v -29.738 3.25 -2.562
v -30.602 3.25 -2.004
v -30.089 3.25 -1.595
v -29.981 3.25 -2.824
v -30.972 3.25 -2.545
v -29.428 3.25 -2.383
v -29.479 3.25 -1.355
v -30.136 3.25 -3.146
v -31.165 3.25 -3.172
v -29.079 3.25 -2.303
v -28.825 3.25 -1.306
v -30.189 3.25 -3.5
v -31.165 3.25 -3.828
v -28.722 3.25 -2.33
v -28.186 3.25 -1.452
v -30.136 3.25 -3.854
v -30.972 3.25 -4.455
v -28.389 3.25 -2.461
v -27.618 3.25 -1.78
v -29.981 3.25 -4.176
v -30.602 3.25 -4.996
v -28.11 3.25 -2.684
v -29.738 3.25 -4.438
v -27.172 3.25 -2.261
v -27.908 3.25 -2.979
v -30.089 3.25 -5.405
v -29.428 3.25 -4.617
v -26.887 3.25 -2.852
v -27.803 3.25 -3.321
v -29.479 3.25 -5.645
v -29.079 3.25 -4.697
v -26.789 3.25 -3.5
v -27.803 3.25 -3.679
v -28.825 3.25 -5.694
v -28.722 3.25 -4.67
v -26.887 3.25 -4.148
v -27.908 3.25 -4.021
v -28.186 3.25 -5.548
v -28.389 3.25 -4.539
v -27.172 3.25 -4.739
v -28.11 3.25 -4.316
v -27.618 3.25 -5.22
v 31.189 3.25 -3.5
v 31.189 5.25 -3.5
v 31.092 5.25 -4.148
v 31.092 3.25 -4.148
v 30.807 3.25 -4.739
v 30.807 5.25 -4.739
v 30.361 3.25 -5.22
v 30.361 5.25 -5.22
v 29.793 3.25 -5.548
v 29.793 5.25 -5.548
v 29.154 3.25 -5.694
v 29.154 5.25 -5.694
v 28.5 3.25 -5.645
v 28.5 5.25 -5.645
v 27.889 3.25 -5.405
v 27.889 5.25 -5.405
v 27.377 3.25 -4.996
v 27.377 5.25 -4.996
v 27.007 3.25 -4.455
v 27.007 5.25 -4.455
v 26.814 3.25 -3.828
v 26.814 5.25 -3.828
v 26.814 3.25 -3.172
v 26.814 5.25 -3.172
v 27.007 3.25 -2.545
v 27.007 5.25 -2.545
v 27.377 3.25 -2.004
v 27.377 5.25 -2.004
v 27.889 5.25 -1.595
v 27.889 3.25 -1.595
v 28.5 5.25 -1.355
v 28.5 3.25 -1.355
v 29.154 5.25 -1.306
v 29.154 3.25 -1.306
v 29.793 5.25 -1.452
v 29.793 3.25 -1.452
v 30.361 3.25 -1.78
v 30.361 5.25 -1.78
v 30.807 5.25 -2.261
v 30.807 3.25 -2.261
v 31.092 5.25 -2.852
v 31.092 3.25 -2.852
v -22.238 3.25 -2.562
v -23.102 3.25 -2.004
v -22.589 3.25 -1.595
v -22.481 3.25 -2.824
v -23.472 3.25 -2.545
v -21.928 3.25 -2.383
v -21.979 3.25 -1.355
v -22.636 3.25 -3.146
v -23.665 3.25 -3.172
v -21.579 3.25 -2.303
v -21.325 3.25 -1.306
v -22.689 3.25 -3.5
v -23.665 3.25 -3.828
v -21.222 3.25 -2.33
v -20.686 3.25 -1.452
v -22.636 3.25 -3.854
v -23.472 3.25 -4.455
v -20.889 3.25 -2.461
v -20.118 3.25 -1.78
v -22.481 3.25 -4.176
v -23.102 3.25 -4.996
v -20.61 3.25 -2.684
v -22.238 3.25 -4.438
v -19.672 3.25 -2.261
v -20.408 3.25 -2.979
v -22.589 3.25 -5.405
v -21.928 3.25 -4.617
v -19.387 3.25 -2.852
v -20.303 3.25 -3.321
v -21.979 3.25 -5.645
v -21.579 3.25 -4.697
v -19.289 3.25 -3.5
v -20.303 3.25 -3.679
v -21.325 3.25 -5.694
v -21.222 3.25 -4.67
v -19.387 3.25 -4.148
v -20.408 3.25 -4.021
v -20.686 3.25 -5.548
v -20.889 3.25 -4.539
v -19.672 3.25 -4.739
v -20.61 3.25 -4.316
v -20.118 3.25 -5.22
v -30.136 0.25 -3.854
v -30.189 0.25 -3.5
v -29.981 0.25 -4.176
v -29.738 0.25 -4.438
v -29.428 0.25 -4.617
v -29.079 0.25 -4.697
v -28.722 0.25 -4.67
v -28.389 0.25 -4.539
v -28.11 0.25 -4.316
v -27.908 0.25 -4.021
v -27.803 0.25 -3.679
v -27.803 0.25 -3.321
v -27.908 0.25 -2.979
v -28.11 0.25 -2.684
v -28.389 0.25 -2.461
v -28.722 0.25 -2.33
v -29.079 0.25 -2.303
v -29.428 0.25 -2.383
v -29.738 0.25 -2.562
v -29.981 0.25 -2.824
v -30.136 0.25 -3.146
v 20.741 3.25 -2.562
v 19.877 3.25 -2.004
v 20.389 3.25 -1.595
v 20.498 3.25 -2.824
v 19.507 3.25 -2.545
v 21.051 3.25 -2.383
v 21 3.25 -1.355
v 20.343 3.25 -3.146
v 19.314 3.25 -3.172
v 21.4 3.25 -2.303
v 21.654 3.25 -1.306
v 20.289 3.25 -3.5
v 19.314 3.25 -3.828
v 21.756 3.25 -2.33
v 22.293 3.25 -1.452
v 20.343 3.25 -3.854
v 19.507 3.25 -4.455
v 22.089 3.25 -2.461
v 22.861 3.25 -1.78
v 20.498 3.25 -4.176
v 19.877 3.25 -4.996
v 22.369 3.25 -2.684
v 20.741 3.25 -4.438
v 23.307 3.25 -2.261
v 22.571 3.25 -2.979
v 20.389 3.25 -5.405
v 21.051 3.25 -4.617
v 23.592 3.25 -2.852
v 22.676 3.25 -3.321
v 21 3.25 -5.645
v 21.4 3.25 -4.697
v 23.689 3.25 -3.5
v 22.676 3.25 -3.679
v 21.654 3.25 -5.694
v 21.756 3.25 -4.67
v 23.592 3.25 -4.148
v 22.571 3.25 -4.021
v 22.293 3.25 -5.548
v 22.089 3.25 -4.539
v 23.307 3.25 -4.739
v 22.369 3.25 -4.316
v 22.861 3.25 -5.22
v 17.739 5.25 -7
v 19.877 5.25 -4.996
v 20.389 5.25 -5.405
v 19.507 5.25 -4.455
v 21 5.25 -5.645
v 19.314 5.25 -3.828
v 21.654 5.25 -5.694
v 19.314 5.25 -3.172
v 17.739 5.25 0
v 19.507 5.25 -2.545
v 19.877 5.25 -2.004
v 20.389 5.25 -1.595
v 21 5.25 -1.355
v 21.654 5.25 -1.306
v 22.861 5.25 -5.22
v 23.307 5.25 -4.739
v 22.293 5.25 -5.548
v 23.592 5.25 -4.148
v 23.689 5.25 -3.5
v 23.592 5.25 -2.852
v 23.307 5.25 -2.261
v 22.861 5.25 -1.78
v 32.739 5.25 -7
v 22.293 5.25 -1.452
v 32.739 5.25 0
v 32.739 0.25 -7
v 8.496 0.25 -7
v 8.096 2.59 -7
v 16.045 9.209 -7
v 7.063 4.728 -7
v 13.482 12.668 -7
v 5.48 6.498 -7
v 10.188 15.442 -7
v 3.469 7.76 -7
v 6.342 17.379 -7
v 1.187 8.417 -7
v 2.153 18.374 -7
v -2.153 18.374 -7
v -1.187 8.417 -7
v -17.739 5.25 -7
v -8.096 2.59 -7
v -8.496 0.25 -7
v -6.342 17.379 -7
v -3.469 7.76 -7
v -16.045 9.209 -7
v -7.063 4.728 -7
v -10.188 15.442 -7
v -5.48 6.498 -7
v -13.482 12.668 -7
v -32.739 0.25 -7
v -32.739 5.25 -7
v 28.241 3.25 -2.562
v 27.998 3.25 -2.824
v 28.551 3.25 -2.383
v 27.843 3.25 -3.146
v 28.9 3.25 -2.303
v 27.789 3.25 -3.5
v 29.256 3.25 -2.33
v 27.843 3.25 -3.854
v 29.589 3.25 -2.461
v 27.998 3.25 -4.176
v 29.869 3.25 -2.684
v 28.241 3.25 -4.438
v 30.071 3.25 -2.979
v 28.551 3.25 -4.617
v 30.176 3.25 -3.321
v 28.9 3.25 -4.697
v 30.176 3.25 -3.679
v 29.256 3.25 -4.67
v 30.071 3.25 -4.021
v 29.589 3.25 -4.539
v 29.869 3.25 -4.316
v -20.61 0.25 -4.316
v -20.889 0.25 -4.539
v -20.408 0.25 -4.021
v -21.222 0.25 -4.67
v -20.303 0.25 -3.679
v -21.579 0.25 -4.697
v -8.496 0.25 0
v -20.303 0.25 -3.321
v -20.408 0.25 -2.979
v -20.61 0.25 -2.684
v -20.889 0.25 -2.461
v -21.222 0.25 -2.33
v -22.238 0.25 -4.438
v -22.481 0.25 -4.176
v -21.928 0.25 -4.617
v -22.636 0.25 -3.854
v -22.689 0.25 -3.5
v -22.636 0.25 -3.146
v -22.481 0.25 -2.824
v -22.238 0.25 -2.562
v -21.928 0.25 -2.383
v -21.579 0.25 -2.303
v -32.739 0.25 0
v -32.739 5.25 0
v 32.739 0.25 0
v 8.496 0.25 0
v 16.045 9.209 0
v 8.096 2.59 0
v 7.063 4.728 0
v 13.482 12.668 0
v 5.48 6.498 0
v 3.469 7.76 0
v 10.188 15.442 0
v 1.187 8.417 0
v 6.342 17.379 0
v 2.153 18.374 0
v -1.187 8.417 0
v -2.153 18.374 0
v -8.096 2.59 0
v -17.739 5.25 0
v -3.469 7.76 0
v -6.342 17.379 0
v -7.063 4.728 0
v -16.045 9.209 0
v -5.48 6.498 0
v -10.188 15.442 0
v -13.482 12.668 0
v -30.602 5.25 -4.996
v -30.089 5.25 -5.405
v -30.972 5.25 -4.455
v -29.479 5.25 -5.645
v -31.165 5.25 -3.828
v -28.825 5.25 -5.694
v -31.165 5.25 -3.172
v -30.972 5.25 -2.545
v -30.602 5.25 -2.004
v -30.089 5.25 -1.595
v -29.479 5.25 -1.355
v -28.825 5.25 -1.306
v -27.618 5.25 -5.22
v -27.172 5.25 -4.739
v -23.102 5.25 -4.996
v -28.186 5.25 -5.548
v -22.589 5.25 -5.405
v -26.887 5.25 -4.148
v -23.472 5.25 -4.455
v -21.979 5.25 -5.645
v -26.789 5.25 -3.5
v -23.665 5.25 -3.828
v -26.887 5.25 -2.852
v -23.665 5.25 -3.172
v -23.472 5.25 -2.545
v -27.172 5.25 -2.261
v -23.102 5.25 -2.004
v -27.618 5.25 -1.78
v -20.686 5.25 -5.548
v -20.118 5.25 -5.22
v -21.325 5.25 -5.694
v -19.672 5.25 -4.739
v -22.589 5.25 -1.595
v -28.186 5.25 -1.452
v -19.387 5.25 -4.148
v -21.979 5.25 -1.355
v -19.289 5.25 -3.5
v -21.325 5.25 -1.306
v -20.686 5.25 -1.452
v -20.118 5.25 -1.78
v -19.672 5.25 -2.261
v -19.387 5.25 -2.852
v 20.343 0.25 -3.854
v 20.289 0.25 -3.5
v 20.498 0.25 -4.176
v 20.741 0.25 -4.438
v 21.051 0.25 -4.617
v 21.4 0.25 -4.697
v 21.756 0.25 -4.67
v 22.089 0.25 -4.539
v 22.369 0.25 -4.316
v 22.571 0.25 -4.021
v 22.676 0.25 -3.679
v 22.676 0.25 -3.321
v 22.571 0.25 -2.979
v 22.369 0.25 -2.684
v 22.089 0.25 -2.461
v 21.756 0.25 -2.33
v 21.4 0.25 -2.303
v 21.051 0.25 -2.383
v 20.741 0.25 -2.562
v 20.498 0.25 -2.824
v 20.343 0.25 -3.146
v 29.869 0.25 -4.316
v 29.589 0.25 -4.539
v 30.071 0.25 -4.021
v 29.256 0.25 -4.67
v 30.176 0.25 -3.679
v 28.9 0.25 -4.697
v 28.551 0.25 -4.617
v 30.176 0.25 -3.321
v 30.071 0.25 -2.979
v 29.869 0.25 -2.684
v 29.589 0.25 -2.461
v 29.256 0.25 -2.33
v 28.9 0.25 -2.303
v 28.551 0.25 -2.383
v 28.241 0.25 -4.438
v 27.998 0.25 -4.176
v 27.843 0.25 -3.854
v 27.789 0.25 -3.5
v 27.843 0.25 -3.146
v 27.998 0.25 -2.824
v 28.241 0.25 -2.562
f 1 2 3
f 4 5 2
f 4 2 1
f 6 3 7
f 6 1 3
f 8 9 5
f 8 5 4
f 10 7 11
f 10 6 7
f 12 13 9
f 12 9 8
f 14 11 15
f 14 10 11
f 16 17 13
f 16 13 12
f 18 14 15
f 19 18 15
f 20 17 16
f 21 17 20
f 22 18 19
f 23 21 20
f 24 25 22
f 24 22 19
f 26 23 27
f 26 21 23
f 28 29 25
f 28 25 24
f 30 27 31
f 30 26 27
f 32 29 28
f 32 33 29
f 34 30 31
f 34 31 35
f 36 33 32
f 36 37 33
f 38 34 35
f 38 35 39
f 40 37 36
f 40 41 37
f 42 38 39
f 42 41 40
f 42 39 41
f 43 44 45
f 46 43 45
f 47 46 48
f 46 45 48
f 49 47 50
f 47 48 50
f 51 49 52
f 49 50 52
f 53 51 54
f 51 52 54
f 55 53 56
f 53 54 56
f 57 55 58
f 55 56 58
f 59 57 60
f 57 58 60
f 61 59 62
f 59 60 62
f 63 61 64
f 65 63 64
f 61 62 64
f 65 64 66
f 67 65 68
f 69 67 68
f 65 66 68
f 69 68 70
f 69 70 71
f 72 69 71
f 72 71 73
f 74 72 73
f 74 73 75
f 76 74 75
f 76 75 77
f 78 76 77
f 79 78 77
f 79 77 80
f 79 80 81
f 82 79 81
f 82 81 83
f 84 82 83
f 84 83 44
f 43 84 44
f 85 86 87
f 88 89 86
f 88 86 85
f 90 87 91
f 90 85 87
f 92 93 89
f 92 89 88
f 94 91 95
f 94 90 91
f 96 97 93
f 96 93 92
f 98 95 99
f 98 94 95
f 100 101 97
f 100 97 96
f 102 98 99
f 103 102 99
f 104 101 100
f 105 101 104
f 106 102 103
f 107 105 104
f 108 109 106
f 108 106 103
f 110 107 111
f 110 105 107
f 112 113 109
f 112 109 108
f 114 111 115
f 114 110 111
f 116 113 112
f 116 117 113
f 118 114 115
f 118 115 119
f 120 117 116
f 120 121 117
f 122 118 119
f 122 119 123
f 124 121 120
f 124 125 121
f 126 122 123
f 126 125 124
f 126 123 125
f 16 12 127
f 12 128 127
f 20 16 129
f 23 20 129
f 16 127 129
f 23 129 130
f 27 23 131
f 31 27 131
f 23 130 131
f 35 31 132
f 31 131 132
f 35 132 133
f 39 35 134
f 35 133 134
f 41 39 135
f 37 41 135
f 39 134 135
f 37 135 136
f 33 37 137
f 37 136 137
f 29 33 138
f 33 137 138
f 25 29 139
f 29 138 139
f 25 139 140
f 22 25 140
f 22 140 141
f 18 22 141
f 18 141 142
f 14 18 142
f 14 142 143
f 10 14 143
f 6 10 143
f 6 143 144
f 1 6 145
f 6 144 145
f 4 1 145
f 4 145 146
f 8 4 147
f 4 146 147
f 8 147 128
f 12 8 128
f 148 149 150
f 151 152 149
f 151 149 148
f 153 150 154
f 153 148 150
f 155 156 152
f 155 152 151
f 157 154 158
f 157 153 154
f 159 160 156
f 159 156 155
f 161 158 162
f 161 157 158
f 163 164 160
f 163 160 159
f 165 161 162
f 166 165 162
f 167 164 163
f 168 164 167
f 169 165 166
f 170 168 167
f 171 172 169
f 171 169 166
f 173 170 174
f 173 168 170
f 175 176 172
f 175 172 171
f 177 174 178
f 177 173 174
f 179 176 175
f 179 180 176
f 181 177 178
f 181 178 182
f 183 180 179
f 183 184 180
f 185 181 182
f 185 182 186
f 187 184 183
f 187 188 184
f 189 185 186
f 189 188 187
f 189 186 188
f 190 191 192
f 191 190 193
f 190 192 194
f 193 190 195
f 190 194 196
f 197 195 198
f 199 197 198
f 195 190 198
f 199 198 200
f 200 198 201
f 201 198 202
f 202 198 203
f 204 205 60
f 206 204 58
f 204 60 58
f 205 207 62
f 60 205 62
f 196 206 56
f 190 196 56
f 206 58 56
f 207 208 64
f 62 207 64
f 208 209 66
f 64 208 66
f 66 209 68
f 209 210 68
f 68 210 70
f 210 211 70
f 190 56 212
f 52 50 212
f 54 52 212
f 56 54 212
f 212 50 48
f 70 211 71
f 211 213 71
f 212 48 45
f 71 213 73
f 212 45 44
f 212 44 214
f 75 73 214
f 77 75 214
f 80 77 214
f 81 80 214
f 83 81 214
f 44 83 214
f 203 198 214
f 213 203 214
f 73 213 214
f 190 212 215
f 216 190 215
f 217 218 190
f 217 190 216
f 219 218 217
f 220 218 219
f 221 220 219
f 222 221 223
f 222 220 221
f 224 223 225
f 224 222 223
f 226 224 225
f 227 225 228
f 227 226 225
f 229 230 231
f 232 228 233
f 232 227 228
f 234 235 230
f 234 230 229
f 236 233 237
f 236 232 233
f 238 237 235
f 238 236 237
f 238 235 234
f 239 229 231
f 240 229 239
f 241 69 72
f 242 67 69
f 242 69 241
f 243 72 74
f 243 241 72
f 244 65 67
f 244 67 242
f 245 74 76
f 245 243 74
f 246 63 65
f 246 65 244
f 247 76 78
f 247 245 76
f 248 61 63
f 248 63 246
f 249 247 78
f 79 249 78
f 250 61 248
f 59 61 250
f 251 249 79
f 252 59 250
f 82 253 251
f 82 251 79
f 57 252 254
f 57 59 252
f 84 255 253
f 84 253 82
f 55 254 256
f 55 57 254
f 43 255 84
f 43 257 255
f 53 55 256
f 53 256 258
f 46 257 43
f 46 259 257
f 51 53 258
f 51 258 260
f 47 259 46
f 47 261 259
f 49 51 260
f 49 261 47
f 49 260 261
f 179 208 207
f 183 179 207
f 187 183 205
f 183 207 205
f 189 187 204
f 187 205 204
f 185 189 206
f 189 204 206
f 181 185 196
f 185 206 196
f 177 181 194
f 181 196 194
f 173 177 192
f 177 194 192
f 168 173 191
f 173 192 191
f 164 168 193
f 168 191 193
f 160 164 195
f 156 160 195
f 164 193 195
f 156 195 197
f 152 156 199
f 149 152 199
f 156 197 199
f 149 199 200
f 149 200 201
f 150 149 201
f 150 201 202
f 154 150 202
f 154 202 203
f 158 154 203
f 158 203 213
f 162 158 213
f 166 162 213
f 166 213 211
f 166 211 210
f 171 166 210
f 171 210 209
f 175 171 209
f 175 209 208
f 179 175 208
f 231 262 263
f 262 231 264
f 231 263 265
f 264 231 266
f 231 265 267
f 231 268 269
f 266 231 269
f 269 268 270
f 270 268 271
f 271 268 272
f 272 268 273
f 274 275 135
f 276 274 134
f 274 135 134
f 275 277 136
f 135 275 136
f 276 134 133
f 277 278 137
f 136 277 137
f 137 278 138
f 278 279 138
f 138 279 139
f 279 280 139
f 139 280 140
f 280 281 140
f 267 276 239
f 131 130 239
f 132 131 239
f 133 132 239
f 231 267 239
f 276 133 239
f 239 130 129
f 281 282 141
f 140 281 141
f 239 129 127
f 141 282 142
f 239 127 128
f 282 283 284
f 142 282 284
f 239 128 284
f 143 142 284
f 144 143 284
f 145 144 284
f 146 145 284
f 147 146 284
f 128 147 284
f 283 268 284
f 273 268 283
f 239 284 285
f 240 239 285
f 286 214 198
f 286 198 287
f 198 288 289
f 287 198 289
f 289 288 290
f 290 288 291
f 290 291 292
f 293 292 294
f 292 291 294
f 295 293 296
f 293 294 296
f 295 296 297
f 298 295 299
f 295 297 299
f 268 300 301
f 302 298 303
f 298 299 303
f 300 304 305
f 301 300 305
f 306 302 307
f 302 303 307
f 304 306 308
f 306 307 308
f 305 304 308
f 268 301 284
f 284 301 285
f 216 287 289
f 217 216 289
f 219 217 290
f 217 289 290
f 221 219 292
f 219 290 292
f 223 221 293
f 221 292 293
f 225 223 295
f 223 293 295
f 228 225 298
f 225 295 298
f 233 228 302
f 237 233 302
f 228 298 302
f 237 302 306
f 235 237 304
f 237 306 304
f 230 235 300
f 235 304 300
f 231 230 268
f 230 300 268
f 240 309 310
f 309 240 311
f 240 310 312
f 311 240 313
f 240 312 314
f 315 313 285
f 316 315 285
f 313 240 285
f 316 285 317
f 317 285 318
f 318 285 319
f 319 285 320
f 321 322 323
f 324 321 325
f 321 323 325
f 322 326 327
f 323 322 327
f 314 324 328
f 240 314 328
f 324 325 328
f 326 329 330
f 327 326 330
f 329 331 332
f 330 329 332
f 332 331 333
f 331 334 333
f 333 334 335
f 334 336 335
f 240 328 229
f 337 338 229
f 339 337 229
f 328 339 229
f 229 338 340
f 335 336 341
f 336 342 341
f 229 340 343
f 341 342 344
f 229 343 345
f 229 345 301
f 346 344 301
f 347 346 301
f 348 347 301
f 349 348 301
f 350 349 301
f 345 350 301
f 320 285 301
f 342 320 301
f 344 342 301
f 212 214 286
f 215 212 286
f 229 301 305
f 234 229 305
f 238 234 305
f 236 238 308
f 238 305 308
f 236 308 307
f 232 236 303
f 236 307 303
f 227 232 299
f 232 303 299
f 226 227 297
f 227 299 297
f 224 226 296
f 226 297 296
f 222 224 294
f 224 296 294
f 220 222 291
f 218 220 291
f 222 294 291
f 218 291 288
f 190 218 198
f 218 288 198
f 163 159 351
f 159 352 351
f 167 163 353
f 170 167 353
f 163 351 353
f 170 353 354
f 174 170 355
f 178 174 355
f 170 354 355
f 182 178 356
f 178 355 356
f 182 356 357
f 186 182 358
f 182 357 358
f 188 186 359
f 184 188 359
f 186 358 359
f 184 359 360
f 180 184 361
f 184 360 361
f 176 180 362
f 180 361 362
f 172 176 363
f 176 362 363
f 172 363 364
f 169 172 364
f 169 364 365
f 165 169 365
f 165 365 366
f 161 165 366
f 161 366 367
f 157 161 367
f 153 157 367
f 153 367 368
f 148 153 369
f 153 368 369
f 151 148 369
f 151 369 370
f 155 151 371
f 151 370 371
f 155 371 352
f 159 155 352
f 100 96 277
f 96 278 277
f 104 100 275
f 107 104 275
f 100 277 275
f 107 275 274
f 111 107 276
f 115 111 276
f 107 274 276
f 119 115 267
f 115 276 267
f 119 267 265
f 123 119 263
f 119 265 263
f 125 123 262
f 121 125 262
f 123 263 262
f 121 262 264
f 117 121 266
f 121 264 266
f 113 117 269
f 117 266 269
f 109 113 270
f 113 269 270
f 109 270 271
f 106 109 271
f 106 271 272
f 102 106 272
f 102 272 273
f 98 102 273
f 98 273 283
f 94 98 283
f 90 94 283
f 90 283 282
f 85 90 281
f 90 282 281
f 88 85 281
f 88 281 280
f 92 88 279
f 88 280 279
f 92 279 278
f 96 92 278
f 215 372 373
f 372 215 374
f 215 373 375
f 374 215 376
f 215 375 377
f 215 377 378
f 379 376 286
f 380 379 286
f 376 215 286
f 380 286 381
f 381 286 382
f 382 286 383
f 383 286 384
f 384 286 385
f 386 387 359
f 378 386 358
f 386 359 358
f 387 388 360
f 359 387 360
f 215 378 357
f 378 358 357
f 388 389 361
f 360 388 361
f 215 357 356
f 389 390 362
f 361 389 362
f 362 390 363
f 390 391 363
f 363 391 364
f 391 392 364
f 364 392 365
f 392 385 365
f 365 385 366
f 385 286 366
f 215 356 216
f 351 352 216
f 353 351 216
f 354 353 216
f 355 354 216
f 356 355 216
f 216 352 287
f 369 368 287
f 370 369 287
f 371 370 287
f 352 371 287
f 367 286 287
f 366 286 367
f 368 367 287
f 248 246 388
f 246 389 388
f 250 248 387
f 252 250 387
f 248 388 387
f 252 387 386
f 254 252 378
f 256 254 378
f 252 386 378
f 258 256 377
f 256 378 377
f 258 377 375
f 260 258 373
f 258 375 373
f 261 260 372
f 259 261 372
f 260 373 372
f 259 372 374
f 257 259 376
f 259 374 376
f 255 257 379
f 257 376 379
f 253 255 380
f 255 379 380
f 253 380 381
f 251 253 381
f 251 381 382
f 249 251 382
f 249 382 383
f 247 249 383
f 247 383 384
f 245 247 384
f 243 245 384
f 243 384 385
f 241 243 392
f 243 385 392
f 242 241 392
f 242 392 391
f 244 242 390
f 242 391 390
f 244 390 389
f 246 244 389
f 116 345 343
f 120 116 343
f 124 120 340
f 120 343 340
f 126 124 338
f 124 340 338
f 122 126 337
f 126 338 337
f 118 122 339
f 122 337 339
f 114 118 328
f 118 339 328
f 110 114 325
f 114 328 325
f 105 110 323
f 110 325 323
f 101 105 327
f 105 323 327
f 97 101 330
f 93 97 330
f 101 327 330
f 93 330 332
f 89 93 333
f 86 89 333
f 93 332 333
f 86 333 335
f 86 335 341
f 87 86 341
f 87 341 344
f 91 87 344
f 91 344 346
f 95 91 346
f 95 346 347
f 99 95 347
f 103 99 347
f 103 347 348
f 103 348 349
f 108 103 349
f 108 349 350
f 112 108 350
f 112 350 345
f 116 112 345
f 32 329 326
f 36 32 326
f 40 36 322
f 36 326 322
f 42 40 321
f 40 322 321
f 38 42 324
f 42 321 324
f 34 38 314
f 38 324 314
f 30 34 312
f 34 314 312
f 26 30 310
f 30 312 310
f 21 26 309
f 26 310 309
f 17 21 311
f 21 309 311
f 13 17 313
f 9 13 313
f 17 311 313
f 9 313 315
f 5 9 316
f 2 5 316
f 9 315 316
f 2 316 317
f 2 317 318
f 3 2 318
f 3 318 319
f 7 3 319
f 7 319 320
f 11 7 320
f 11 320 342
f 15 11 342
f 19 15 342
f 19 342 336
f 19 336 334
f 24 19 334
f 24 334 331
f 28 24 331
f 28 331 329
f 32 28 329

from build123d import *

# Parameters (mm, degrees)
BOSS_EXTRUDE1_DEPTH            = 7
CBORE_FOR_M2_SHCS1_D           = 2.4
CBORE_FOR_M2_SHCS1_CBORE_D     = 4.4
CBORE_FOR_M2_SHCS1_CBORE_DEPTH = 2


with BuildPart() as part:
    # Sketch1 → Boss-Extrude1 (new body)
    with BuildSketch(Plane.XY):
        with BuildLine():
            Line((-18.498310734, 0.25), (-32.739433475, 0.25))
            Line((-32.739433475, 0.25), (-32.739433475, 5.25))
            Line((-32.739433475, 5.25), (-17.739433475, 5.25))
            ThreePointArc((-17.739433475, 5.25), (0, 18.5), (17.739433475, 5.25))
            Line((17.739433475, 5.25), (32.739433475, 5.25))
            Line((32.739433475, 5.25), (32.739433475, 0.25))
            Line((32.739433475, 0.25), (18.498310734, 0.25))
            Line((18.498310734, 0.25), (8.496322734, 0.25))
            ThreePointArc((8.496322734, 0.25), (0, 8.5), (-8.496322734, 0.25))
            Line((-8.496322734, 0.25), (-18.498310734, 0.25))
        make_face()
    extrude(amount=-BOSS_EXTRUDE1_DEPTH)

    # CBORE for M2 SHCS1 (through all)
    with Locations(Plane(origin=(0, 5.25, 0), x_dir=(1, 0, 0), z_dir=(0, 1, 0))):
        with Locations((28.989433475, 3.5), (-28.989433475, 3.5), (-21.489433475, 3.5), (21.489433475, 3.5)):
            CounterBoreHole(CBORE_FOR_M2_SHCS1_D / 2, CBORE_FOR_M2_SHCS1_CBORE_D / 2, CBORE_FOR_M2_SHCS1_CBORE_DEPTH)


solid = part.part
